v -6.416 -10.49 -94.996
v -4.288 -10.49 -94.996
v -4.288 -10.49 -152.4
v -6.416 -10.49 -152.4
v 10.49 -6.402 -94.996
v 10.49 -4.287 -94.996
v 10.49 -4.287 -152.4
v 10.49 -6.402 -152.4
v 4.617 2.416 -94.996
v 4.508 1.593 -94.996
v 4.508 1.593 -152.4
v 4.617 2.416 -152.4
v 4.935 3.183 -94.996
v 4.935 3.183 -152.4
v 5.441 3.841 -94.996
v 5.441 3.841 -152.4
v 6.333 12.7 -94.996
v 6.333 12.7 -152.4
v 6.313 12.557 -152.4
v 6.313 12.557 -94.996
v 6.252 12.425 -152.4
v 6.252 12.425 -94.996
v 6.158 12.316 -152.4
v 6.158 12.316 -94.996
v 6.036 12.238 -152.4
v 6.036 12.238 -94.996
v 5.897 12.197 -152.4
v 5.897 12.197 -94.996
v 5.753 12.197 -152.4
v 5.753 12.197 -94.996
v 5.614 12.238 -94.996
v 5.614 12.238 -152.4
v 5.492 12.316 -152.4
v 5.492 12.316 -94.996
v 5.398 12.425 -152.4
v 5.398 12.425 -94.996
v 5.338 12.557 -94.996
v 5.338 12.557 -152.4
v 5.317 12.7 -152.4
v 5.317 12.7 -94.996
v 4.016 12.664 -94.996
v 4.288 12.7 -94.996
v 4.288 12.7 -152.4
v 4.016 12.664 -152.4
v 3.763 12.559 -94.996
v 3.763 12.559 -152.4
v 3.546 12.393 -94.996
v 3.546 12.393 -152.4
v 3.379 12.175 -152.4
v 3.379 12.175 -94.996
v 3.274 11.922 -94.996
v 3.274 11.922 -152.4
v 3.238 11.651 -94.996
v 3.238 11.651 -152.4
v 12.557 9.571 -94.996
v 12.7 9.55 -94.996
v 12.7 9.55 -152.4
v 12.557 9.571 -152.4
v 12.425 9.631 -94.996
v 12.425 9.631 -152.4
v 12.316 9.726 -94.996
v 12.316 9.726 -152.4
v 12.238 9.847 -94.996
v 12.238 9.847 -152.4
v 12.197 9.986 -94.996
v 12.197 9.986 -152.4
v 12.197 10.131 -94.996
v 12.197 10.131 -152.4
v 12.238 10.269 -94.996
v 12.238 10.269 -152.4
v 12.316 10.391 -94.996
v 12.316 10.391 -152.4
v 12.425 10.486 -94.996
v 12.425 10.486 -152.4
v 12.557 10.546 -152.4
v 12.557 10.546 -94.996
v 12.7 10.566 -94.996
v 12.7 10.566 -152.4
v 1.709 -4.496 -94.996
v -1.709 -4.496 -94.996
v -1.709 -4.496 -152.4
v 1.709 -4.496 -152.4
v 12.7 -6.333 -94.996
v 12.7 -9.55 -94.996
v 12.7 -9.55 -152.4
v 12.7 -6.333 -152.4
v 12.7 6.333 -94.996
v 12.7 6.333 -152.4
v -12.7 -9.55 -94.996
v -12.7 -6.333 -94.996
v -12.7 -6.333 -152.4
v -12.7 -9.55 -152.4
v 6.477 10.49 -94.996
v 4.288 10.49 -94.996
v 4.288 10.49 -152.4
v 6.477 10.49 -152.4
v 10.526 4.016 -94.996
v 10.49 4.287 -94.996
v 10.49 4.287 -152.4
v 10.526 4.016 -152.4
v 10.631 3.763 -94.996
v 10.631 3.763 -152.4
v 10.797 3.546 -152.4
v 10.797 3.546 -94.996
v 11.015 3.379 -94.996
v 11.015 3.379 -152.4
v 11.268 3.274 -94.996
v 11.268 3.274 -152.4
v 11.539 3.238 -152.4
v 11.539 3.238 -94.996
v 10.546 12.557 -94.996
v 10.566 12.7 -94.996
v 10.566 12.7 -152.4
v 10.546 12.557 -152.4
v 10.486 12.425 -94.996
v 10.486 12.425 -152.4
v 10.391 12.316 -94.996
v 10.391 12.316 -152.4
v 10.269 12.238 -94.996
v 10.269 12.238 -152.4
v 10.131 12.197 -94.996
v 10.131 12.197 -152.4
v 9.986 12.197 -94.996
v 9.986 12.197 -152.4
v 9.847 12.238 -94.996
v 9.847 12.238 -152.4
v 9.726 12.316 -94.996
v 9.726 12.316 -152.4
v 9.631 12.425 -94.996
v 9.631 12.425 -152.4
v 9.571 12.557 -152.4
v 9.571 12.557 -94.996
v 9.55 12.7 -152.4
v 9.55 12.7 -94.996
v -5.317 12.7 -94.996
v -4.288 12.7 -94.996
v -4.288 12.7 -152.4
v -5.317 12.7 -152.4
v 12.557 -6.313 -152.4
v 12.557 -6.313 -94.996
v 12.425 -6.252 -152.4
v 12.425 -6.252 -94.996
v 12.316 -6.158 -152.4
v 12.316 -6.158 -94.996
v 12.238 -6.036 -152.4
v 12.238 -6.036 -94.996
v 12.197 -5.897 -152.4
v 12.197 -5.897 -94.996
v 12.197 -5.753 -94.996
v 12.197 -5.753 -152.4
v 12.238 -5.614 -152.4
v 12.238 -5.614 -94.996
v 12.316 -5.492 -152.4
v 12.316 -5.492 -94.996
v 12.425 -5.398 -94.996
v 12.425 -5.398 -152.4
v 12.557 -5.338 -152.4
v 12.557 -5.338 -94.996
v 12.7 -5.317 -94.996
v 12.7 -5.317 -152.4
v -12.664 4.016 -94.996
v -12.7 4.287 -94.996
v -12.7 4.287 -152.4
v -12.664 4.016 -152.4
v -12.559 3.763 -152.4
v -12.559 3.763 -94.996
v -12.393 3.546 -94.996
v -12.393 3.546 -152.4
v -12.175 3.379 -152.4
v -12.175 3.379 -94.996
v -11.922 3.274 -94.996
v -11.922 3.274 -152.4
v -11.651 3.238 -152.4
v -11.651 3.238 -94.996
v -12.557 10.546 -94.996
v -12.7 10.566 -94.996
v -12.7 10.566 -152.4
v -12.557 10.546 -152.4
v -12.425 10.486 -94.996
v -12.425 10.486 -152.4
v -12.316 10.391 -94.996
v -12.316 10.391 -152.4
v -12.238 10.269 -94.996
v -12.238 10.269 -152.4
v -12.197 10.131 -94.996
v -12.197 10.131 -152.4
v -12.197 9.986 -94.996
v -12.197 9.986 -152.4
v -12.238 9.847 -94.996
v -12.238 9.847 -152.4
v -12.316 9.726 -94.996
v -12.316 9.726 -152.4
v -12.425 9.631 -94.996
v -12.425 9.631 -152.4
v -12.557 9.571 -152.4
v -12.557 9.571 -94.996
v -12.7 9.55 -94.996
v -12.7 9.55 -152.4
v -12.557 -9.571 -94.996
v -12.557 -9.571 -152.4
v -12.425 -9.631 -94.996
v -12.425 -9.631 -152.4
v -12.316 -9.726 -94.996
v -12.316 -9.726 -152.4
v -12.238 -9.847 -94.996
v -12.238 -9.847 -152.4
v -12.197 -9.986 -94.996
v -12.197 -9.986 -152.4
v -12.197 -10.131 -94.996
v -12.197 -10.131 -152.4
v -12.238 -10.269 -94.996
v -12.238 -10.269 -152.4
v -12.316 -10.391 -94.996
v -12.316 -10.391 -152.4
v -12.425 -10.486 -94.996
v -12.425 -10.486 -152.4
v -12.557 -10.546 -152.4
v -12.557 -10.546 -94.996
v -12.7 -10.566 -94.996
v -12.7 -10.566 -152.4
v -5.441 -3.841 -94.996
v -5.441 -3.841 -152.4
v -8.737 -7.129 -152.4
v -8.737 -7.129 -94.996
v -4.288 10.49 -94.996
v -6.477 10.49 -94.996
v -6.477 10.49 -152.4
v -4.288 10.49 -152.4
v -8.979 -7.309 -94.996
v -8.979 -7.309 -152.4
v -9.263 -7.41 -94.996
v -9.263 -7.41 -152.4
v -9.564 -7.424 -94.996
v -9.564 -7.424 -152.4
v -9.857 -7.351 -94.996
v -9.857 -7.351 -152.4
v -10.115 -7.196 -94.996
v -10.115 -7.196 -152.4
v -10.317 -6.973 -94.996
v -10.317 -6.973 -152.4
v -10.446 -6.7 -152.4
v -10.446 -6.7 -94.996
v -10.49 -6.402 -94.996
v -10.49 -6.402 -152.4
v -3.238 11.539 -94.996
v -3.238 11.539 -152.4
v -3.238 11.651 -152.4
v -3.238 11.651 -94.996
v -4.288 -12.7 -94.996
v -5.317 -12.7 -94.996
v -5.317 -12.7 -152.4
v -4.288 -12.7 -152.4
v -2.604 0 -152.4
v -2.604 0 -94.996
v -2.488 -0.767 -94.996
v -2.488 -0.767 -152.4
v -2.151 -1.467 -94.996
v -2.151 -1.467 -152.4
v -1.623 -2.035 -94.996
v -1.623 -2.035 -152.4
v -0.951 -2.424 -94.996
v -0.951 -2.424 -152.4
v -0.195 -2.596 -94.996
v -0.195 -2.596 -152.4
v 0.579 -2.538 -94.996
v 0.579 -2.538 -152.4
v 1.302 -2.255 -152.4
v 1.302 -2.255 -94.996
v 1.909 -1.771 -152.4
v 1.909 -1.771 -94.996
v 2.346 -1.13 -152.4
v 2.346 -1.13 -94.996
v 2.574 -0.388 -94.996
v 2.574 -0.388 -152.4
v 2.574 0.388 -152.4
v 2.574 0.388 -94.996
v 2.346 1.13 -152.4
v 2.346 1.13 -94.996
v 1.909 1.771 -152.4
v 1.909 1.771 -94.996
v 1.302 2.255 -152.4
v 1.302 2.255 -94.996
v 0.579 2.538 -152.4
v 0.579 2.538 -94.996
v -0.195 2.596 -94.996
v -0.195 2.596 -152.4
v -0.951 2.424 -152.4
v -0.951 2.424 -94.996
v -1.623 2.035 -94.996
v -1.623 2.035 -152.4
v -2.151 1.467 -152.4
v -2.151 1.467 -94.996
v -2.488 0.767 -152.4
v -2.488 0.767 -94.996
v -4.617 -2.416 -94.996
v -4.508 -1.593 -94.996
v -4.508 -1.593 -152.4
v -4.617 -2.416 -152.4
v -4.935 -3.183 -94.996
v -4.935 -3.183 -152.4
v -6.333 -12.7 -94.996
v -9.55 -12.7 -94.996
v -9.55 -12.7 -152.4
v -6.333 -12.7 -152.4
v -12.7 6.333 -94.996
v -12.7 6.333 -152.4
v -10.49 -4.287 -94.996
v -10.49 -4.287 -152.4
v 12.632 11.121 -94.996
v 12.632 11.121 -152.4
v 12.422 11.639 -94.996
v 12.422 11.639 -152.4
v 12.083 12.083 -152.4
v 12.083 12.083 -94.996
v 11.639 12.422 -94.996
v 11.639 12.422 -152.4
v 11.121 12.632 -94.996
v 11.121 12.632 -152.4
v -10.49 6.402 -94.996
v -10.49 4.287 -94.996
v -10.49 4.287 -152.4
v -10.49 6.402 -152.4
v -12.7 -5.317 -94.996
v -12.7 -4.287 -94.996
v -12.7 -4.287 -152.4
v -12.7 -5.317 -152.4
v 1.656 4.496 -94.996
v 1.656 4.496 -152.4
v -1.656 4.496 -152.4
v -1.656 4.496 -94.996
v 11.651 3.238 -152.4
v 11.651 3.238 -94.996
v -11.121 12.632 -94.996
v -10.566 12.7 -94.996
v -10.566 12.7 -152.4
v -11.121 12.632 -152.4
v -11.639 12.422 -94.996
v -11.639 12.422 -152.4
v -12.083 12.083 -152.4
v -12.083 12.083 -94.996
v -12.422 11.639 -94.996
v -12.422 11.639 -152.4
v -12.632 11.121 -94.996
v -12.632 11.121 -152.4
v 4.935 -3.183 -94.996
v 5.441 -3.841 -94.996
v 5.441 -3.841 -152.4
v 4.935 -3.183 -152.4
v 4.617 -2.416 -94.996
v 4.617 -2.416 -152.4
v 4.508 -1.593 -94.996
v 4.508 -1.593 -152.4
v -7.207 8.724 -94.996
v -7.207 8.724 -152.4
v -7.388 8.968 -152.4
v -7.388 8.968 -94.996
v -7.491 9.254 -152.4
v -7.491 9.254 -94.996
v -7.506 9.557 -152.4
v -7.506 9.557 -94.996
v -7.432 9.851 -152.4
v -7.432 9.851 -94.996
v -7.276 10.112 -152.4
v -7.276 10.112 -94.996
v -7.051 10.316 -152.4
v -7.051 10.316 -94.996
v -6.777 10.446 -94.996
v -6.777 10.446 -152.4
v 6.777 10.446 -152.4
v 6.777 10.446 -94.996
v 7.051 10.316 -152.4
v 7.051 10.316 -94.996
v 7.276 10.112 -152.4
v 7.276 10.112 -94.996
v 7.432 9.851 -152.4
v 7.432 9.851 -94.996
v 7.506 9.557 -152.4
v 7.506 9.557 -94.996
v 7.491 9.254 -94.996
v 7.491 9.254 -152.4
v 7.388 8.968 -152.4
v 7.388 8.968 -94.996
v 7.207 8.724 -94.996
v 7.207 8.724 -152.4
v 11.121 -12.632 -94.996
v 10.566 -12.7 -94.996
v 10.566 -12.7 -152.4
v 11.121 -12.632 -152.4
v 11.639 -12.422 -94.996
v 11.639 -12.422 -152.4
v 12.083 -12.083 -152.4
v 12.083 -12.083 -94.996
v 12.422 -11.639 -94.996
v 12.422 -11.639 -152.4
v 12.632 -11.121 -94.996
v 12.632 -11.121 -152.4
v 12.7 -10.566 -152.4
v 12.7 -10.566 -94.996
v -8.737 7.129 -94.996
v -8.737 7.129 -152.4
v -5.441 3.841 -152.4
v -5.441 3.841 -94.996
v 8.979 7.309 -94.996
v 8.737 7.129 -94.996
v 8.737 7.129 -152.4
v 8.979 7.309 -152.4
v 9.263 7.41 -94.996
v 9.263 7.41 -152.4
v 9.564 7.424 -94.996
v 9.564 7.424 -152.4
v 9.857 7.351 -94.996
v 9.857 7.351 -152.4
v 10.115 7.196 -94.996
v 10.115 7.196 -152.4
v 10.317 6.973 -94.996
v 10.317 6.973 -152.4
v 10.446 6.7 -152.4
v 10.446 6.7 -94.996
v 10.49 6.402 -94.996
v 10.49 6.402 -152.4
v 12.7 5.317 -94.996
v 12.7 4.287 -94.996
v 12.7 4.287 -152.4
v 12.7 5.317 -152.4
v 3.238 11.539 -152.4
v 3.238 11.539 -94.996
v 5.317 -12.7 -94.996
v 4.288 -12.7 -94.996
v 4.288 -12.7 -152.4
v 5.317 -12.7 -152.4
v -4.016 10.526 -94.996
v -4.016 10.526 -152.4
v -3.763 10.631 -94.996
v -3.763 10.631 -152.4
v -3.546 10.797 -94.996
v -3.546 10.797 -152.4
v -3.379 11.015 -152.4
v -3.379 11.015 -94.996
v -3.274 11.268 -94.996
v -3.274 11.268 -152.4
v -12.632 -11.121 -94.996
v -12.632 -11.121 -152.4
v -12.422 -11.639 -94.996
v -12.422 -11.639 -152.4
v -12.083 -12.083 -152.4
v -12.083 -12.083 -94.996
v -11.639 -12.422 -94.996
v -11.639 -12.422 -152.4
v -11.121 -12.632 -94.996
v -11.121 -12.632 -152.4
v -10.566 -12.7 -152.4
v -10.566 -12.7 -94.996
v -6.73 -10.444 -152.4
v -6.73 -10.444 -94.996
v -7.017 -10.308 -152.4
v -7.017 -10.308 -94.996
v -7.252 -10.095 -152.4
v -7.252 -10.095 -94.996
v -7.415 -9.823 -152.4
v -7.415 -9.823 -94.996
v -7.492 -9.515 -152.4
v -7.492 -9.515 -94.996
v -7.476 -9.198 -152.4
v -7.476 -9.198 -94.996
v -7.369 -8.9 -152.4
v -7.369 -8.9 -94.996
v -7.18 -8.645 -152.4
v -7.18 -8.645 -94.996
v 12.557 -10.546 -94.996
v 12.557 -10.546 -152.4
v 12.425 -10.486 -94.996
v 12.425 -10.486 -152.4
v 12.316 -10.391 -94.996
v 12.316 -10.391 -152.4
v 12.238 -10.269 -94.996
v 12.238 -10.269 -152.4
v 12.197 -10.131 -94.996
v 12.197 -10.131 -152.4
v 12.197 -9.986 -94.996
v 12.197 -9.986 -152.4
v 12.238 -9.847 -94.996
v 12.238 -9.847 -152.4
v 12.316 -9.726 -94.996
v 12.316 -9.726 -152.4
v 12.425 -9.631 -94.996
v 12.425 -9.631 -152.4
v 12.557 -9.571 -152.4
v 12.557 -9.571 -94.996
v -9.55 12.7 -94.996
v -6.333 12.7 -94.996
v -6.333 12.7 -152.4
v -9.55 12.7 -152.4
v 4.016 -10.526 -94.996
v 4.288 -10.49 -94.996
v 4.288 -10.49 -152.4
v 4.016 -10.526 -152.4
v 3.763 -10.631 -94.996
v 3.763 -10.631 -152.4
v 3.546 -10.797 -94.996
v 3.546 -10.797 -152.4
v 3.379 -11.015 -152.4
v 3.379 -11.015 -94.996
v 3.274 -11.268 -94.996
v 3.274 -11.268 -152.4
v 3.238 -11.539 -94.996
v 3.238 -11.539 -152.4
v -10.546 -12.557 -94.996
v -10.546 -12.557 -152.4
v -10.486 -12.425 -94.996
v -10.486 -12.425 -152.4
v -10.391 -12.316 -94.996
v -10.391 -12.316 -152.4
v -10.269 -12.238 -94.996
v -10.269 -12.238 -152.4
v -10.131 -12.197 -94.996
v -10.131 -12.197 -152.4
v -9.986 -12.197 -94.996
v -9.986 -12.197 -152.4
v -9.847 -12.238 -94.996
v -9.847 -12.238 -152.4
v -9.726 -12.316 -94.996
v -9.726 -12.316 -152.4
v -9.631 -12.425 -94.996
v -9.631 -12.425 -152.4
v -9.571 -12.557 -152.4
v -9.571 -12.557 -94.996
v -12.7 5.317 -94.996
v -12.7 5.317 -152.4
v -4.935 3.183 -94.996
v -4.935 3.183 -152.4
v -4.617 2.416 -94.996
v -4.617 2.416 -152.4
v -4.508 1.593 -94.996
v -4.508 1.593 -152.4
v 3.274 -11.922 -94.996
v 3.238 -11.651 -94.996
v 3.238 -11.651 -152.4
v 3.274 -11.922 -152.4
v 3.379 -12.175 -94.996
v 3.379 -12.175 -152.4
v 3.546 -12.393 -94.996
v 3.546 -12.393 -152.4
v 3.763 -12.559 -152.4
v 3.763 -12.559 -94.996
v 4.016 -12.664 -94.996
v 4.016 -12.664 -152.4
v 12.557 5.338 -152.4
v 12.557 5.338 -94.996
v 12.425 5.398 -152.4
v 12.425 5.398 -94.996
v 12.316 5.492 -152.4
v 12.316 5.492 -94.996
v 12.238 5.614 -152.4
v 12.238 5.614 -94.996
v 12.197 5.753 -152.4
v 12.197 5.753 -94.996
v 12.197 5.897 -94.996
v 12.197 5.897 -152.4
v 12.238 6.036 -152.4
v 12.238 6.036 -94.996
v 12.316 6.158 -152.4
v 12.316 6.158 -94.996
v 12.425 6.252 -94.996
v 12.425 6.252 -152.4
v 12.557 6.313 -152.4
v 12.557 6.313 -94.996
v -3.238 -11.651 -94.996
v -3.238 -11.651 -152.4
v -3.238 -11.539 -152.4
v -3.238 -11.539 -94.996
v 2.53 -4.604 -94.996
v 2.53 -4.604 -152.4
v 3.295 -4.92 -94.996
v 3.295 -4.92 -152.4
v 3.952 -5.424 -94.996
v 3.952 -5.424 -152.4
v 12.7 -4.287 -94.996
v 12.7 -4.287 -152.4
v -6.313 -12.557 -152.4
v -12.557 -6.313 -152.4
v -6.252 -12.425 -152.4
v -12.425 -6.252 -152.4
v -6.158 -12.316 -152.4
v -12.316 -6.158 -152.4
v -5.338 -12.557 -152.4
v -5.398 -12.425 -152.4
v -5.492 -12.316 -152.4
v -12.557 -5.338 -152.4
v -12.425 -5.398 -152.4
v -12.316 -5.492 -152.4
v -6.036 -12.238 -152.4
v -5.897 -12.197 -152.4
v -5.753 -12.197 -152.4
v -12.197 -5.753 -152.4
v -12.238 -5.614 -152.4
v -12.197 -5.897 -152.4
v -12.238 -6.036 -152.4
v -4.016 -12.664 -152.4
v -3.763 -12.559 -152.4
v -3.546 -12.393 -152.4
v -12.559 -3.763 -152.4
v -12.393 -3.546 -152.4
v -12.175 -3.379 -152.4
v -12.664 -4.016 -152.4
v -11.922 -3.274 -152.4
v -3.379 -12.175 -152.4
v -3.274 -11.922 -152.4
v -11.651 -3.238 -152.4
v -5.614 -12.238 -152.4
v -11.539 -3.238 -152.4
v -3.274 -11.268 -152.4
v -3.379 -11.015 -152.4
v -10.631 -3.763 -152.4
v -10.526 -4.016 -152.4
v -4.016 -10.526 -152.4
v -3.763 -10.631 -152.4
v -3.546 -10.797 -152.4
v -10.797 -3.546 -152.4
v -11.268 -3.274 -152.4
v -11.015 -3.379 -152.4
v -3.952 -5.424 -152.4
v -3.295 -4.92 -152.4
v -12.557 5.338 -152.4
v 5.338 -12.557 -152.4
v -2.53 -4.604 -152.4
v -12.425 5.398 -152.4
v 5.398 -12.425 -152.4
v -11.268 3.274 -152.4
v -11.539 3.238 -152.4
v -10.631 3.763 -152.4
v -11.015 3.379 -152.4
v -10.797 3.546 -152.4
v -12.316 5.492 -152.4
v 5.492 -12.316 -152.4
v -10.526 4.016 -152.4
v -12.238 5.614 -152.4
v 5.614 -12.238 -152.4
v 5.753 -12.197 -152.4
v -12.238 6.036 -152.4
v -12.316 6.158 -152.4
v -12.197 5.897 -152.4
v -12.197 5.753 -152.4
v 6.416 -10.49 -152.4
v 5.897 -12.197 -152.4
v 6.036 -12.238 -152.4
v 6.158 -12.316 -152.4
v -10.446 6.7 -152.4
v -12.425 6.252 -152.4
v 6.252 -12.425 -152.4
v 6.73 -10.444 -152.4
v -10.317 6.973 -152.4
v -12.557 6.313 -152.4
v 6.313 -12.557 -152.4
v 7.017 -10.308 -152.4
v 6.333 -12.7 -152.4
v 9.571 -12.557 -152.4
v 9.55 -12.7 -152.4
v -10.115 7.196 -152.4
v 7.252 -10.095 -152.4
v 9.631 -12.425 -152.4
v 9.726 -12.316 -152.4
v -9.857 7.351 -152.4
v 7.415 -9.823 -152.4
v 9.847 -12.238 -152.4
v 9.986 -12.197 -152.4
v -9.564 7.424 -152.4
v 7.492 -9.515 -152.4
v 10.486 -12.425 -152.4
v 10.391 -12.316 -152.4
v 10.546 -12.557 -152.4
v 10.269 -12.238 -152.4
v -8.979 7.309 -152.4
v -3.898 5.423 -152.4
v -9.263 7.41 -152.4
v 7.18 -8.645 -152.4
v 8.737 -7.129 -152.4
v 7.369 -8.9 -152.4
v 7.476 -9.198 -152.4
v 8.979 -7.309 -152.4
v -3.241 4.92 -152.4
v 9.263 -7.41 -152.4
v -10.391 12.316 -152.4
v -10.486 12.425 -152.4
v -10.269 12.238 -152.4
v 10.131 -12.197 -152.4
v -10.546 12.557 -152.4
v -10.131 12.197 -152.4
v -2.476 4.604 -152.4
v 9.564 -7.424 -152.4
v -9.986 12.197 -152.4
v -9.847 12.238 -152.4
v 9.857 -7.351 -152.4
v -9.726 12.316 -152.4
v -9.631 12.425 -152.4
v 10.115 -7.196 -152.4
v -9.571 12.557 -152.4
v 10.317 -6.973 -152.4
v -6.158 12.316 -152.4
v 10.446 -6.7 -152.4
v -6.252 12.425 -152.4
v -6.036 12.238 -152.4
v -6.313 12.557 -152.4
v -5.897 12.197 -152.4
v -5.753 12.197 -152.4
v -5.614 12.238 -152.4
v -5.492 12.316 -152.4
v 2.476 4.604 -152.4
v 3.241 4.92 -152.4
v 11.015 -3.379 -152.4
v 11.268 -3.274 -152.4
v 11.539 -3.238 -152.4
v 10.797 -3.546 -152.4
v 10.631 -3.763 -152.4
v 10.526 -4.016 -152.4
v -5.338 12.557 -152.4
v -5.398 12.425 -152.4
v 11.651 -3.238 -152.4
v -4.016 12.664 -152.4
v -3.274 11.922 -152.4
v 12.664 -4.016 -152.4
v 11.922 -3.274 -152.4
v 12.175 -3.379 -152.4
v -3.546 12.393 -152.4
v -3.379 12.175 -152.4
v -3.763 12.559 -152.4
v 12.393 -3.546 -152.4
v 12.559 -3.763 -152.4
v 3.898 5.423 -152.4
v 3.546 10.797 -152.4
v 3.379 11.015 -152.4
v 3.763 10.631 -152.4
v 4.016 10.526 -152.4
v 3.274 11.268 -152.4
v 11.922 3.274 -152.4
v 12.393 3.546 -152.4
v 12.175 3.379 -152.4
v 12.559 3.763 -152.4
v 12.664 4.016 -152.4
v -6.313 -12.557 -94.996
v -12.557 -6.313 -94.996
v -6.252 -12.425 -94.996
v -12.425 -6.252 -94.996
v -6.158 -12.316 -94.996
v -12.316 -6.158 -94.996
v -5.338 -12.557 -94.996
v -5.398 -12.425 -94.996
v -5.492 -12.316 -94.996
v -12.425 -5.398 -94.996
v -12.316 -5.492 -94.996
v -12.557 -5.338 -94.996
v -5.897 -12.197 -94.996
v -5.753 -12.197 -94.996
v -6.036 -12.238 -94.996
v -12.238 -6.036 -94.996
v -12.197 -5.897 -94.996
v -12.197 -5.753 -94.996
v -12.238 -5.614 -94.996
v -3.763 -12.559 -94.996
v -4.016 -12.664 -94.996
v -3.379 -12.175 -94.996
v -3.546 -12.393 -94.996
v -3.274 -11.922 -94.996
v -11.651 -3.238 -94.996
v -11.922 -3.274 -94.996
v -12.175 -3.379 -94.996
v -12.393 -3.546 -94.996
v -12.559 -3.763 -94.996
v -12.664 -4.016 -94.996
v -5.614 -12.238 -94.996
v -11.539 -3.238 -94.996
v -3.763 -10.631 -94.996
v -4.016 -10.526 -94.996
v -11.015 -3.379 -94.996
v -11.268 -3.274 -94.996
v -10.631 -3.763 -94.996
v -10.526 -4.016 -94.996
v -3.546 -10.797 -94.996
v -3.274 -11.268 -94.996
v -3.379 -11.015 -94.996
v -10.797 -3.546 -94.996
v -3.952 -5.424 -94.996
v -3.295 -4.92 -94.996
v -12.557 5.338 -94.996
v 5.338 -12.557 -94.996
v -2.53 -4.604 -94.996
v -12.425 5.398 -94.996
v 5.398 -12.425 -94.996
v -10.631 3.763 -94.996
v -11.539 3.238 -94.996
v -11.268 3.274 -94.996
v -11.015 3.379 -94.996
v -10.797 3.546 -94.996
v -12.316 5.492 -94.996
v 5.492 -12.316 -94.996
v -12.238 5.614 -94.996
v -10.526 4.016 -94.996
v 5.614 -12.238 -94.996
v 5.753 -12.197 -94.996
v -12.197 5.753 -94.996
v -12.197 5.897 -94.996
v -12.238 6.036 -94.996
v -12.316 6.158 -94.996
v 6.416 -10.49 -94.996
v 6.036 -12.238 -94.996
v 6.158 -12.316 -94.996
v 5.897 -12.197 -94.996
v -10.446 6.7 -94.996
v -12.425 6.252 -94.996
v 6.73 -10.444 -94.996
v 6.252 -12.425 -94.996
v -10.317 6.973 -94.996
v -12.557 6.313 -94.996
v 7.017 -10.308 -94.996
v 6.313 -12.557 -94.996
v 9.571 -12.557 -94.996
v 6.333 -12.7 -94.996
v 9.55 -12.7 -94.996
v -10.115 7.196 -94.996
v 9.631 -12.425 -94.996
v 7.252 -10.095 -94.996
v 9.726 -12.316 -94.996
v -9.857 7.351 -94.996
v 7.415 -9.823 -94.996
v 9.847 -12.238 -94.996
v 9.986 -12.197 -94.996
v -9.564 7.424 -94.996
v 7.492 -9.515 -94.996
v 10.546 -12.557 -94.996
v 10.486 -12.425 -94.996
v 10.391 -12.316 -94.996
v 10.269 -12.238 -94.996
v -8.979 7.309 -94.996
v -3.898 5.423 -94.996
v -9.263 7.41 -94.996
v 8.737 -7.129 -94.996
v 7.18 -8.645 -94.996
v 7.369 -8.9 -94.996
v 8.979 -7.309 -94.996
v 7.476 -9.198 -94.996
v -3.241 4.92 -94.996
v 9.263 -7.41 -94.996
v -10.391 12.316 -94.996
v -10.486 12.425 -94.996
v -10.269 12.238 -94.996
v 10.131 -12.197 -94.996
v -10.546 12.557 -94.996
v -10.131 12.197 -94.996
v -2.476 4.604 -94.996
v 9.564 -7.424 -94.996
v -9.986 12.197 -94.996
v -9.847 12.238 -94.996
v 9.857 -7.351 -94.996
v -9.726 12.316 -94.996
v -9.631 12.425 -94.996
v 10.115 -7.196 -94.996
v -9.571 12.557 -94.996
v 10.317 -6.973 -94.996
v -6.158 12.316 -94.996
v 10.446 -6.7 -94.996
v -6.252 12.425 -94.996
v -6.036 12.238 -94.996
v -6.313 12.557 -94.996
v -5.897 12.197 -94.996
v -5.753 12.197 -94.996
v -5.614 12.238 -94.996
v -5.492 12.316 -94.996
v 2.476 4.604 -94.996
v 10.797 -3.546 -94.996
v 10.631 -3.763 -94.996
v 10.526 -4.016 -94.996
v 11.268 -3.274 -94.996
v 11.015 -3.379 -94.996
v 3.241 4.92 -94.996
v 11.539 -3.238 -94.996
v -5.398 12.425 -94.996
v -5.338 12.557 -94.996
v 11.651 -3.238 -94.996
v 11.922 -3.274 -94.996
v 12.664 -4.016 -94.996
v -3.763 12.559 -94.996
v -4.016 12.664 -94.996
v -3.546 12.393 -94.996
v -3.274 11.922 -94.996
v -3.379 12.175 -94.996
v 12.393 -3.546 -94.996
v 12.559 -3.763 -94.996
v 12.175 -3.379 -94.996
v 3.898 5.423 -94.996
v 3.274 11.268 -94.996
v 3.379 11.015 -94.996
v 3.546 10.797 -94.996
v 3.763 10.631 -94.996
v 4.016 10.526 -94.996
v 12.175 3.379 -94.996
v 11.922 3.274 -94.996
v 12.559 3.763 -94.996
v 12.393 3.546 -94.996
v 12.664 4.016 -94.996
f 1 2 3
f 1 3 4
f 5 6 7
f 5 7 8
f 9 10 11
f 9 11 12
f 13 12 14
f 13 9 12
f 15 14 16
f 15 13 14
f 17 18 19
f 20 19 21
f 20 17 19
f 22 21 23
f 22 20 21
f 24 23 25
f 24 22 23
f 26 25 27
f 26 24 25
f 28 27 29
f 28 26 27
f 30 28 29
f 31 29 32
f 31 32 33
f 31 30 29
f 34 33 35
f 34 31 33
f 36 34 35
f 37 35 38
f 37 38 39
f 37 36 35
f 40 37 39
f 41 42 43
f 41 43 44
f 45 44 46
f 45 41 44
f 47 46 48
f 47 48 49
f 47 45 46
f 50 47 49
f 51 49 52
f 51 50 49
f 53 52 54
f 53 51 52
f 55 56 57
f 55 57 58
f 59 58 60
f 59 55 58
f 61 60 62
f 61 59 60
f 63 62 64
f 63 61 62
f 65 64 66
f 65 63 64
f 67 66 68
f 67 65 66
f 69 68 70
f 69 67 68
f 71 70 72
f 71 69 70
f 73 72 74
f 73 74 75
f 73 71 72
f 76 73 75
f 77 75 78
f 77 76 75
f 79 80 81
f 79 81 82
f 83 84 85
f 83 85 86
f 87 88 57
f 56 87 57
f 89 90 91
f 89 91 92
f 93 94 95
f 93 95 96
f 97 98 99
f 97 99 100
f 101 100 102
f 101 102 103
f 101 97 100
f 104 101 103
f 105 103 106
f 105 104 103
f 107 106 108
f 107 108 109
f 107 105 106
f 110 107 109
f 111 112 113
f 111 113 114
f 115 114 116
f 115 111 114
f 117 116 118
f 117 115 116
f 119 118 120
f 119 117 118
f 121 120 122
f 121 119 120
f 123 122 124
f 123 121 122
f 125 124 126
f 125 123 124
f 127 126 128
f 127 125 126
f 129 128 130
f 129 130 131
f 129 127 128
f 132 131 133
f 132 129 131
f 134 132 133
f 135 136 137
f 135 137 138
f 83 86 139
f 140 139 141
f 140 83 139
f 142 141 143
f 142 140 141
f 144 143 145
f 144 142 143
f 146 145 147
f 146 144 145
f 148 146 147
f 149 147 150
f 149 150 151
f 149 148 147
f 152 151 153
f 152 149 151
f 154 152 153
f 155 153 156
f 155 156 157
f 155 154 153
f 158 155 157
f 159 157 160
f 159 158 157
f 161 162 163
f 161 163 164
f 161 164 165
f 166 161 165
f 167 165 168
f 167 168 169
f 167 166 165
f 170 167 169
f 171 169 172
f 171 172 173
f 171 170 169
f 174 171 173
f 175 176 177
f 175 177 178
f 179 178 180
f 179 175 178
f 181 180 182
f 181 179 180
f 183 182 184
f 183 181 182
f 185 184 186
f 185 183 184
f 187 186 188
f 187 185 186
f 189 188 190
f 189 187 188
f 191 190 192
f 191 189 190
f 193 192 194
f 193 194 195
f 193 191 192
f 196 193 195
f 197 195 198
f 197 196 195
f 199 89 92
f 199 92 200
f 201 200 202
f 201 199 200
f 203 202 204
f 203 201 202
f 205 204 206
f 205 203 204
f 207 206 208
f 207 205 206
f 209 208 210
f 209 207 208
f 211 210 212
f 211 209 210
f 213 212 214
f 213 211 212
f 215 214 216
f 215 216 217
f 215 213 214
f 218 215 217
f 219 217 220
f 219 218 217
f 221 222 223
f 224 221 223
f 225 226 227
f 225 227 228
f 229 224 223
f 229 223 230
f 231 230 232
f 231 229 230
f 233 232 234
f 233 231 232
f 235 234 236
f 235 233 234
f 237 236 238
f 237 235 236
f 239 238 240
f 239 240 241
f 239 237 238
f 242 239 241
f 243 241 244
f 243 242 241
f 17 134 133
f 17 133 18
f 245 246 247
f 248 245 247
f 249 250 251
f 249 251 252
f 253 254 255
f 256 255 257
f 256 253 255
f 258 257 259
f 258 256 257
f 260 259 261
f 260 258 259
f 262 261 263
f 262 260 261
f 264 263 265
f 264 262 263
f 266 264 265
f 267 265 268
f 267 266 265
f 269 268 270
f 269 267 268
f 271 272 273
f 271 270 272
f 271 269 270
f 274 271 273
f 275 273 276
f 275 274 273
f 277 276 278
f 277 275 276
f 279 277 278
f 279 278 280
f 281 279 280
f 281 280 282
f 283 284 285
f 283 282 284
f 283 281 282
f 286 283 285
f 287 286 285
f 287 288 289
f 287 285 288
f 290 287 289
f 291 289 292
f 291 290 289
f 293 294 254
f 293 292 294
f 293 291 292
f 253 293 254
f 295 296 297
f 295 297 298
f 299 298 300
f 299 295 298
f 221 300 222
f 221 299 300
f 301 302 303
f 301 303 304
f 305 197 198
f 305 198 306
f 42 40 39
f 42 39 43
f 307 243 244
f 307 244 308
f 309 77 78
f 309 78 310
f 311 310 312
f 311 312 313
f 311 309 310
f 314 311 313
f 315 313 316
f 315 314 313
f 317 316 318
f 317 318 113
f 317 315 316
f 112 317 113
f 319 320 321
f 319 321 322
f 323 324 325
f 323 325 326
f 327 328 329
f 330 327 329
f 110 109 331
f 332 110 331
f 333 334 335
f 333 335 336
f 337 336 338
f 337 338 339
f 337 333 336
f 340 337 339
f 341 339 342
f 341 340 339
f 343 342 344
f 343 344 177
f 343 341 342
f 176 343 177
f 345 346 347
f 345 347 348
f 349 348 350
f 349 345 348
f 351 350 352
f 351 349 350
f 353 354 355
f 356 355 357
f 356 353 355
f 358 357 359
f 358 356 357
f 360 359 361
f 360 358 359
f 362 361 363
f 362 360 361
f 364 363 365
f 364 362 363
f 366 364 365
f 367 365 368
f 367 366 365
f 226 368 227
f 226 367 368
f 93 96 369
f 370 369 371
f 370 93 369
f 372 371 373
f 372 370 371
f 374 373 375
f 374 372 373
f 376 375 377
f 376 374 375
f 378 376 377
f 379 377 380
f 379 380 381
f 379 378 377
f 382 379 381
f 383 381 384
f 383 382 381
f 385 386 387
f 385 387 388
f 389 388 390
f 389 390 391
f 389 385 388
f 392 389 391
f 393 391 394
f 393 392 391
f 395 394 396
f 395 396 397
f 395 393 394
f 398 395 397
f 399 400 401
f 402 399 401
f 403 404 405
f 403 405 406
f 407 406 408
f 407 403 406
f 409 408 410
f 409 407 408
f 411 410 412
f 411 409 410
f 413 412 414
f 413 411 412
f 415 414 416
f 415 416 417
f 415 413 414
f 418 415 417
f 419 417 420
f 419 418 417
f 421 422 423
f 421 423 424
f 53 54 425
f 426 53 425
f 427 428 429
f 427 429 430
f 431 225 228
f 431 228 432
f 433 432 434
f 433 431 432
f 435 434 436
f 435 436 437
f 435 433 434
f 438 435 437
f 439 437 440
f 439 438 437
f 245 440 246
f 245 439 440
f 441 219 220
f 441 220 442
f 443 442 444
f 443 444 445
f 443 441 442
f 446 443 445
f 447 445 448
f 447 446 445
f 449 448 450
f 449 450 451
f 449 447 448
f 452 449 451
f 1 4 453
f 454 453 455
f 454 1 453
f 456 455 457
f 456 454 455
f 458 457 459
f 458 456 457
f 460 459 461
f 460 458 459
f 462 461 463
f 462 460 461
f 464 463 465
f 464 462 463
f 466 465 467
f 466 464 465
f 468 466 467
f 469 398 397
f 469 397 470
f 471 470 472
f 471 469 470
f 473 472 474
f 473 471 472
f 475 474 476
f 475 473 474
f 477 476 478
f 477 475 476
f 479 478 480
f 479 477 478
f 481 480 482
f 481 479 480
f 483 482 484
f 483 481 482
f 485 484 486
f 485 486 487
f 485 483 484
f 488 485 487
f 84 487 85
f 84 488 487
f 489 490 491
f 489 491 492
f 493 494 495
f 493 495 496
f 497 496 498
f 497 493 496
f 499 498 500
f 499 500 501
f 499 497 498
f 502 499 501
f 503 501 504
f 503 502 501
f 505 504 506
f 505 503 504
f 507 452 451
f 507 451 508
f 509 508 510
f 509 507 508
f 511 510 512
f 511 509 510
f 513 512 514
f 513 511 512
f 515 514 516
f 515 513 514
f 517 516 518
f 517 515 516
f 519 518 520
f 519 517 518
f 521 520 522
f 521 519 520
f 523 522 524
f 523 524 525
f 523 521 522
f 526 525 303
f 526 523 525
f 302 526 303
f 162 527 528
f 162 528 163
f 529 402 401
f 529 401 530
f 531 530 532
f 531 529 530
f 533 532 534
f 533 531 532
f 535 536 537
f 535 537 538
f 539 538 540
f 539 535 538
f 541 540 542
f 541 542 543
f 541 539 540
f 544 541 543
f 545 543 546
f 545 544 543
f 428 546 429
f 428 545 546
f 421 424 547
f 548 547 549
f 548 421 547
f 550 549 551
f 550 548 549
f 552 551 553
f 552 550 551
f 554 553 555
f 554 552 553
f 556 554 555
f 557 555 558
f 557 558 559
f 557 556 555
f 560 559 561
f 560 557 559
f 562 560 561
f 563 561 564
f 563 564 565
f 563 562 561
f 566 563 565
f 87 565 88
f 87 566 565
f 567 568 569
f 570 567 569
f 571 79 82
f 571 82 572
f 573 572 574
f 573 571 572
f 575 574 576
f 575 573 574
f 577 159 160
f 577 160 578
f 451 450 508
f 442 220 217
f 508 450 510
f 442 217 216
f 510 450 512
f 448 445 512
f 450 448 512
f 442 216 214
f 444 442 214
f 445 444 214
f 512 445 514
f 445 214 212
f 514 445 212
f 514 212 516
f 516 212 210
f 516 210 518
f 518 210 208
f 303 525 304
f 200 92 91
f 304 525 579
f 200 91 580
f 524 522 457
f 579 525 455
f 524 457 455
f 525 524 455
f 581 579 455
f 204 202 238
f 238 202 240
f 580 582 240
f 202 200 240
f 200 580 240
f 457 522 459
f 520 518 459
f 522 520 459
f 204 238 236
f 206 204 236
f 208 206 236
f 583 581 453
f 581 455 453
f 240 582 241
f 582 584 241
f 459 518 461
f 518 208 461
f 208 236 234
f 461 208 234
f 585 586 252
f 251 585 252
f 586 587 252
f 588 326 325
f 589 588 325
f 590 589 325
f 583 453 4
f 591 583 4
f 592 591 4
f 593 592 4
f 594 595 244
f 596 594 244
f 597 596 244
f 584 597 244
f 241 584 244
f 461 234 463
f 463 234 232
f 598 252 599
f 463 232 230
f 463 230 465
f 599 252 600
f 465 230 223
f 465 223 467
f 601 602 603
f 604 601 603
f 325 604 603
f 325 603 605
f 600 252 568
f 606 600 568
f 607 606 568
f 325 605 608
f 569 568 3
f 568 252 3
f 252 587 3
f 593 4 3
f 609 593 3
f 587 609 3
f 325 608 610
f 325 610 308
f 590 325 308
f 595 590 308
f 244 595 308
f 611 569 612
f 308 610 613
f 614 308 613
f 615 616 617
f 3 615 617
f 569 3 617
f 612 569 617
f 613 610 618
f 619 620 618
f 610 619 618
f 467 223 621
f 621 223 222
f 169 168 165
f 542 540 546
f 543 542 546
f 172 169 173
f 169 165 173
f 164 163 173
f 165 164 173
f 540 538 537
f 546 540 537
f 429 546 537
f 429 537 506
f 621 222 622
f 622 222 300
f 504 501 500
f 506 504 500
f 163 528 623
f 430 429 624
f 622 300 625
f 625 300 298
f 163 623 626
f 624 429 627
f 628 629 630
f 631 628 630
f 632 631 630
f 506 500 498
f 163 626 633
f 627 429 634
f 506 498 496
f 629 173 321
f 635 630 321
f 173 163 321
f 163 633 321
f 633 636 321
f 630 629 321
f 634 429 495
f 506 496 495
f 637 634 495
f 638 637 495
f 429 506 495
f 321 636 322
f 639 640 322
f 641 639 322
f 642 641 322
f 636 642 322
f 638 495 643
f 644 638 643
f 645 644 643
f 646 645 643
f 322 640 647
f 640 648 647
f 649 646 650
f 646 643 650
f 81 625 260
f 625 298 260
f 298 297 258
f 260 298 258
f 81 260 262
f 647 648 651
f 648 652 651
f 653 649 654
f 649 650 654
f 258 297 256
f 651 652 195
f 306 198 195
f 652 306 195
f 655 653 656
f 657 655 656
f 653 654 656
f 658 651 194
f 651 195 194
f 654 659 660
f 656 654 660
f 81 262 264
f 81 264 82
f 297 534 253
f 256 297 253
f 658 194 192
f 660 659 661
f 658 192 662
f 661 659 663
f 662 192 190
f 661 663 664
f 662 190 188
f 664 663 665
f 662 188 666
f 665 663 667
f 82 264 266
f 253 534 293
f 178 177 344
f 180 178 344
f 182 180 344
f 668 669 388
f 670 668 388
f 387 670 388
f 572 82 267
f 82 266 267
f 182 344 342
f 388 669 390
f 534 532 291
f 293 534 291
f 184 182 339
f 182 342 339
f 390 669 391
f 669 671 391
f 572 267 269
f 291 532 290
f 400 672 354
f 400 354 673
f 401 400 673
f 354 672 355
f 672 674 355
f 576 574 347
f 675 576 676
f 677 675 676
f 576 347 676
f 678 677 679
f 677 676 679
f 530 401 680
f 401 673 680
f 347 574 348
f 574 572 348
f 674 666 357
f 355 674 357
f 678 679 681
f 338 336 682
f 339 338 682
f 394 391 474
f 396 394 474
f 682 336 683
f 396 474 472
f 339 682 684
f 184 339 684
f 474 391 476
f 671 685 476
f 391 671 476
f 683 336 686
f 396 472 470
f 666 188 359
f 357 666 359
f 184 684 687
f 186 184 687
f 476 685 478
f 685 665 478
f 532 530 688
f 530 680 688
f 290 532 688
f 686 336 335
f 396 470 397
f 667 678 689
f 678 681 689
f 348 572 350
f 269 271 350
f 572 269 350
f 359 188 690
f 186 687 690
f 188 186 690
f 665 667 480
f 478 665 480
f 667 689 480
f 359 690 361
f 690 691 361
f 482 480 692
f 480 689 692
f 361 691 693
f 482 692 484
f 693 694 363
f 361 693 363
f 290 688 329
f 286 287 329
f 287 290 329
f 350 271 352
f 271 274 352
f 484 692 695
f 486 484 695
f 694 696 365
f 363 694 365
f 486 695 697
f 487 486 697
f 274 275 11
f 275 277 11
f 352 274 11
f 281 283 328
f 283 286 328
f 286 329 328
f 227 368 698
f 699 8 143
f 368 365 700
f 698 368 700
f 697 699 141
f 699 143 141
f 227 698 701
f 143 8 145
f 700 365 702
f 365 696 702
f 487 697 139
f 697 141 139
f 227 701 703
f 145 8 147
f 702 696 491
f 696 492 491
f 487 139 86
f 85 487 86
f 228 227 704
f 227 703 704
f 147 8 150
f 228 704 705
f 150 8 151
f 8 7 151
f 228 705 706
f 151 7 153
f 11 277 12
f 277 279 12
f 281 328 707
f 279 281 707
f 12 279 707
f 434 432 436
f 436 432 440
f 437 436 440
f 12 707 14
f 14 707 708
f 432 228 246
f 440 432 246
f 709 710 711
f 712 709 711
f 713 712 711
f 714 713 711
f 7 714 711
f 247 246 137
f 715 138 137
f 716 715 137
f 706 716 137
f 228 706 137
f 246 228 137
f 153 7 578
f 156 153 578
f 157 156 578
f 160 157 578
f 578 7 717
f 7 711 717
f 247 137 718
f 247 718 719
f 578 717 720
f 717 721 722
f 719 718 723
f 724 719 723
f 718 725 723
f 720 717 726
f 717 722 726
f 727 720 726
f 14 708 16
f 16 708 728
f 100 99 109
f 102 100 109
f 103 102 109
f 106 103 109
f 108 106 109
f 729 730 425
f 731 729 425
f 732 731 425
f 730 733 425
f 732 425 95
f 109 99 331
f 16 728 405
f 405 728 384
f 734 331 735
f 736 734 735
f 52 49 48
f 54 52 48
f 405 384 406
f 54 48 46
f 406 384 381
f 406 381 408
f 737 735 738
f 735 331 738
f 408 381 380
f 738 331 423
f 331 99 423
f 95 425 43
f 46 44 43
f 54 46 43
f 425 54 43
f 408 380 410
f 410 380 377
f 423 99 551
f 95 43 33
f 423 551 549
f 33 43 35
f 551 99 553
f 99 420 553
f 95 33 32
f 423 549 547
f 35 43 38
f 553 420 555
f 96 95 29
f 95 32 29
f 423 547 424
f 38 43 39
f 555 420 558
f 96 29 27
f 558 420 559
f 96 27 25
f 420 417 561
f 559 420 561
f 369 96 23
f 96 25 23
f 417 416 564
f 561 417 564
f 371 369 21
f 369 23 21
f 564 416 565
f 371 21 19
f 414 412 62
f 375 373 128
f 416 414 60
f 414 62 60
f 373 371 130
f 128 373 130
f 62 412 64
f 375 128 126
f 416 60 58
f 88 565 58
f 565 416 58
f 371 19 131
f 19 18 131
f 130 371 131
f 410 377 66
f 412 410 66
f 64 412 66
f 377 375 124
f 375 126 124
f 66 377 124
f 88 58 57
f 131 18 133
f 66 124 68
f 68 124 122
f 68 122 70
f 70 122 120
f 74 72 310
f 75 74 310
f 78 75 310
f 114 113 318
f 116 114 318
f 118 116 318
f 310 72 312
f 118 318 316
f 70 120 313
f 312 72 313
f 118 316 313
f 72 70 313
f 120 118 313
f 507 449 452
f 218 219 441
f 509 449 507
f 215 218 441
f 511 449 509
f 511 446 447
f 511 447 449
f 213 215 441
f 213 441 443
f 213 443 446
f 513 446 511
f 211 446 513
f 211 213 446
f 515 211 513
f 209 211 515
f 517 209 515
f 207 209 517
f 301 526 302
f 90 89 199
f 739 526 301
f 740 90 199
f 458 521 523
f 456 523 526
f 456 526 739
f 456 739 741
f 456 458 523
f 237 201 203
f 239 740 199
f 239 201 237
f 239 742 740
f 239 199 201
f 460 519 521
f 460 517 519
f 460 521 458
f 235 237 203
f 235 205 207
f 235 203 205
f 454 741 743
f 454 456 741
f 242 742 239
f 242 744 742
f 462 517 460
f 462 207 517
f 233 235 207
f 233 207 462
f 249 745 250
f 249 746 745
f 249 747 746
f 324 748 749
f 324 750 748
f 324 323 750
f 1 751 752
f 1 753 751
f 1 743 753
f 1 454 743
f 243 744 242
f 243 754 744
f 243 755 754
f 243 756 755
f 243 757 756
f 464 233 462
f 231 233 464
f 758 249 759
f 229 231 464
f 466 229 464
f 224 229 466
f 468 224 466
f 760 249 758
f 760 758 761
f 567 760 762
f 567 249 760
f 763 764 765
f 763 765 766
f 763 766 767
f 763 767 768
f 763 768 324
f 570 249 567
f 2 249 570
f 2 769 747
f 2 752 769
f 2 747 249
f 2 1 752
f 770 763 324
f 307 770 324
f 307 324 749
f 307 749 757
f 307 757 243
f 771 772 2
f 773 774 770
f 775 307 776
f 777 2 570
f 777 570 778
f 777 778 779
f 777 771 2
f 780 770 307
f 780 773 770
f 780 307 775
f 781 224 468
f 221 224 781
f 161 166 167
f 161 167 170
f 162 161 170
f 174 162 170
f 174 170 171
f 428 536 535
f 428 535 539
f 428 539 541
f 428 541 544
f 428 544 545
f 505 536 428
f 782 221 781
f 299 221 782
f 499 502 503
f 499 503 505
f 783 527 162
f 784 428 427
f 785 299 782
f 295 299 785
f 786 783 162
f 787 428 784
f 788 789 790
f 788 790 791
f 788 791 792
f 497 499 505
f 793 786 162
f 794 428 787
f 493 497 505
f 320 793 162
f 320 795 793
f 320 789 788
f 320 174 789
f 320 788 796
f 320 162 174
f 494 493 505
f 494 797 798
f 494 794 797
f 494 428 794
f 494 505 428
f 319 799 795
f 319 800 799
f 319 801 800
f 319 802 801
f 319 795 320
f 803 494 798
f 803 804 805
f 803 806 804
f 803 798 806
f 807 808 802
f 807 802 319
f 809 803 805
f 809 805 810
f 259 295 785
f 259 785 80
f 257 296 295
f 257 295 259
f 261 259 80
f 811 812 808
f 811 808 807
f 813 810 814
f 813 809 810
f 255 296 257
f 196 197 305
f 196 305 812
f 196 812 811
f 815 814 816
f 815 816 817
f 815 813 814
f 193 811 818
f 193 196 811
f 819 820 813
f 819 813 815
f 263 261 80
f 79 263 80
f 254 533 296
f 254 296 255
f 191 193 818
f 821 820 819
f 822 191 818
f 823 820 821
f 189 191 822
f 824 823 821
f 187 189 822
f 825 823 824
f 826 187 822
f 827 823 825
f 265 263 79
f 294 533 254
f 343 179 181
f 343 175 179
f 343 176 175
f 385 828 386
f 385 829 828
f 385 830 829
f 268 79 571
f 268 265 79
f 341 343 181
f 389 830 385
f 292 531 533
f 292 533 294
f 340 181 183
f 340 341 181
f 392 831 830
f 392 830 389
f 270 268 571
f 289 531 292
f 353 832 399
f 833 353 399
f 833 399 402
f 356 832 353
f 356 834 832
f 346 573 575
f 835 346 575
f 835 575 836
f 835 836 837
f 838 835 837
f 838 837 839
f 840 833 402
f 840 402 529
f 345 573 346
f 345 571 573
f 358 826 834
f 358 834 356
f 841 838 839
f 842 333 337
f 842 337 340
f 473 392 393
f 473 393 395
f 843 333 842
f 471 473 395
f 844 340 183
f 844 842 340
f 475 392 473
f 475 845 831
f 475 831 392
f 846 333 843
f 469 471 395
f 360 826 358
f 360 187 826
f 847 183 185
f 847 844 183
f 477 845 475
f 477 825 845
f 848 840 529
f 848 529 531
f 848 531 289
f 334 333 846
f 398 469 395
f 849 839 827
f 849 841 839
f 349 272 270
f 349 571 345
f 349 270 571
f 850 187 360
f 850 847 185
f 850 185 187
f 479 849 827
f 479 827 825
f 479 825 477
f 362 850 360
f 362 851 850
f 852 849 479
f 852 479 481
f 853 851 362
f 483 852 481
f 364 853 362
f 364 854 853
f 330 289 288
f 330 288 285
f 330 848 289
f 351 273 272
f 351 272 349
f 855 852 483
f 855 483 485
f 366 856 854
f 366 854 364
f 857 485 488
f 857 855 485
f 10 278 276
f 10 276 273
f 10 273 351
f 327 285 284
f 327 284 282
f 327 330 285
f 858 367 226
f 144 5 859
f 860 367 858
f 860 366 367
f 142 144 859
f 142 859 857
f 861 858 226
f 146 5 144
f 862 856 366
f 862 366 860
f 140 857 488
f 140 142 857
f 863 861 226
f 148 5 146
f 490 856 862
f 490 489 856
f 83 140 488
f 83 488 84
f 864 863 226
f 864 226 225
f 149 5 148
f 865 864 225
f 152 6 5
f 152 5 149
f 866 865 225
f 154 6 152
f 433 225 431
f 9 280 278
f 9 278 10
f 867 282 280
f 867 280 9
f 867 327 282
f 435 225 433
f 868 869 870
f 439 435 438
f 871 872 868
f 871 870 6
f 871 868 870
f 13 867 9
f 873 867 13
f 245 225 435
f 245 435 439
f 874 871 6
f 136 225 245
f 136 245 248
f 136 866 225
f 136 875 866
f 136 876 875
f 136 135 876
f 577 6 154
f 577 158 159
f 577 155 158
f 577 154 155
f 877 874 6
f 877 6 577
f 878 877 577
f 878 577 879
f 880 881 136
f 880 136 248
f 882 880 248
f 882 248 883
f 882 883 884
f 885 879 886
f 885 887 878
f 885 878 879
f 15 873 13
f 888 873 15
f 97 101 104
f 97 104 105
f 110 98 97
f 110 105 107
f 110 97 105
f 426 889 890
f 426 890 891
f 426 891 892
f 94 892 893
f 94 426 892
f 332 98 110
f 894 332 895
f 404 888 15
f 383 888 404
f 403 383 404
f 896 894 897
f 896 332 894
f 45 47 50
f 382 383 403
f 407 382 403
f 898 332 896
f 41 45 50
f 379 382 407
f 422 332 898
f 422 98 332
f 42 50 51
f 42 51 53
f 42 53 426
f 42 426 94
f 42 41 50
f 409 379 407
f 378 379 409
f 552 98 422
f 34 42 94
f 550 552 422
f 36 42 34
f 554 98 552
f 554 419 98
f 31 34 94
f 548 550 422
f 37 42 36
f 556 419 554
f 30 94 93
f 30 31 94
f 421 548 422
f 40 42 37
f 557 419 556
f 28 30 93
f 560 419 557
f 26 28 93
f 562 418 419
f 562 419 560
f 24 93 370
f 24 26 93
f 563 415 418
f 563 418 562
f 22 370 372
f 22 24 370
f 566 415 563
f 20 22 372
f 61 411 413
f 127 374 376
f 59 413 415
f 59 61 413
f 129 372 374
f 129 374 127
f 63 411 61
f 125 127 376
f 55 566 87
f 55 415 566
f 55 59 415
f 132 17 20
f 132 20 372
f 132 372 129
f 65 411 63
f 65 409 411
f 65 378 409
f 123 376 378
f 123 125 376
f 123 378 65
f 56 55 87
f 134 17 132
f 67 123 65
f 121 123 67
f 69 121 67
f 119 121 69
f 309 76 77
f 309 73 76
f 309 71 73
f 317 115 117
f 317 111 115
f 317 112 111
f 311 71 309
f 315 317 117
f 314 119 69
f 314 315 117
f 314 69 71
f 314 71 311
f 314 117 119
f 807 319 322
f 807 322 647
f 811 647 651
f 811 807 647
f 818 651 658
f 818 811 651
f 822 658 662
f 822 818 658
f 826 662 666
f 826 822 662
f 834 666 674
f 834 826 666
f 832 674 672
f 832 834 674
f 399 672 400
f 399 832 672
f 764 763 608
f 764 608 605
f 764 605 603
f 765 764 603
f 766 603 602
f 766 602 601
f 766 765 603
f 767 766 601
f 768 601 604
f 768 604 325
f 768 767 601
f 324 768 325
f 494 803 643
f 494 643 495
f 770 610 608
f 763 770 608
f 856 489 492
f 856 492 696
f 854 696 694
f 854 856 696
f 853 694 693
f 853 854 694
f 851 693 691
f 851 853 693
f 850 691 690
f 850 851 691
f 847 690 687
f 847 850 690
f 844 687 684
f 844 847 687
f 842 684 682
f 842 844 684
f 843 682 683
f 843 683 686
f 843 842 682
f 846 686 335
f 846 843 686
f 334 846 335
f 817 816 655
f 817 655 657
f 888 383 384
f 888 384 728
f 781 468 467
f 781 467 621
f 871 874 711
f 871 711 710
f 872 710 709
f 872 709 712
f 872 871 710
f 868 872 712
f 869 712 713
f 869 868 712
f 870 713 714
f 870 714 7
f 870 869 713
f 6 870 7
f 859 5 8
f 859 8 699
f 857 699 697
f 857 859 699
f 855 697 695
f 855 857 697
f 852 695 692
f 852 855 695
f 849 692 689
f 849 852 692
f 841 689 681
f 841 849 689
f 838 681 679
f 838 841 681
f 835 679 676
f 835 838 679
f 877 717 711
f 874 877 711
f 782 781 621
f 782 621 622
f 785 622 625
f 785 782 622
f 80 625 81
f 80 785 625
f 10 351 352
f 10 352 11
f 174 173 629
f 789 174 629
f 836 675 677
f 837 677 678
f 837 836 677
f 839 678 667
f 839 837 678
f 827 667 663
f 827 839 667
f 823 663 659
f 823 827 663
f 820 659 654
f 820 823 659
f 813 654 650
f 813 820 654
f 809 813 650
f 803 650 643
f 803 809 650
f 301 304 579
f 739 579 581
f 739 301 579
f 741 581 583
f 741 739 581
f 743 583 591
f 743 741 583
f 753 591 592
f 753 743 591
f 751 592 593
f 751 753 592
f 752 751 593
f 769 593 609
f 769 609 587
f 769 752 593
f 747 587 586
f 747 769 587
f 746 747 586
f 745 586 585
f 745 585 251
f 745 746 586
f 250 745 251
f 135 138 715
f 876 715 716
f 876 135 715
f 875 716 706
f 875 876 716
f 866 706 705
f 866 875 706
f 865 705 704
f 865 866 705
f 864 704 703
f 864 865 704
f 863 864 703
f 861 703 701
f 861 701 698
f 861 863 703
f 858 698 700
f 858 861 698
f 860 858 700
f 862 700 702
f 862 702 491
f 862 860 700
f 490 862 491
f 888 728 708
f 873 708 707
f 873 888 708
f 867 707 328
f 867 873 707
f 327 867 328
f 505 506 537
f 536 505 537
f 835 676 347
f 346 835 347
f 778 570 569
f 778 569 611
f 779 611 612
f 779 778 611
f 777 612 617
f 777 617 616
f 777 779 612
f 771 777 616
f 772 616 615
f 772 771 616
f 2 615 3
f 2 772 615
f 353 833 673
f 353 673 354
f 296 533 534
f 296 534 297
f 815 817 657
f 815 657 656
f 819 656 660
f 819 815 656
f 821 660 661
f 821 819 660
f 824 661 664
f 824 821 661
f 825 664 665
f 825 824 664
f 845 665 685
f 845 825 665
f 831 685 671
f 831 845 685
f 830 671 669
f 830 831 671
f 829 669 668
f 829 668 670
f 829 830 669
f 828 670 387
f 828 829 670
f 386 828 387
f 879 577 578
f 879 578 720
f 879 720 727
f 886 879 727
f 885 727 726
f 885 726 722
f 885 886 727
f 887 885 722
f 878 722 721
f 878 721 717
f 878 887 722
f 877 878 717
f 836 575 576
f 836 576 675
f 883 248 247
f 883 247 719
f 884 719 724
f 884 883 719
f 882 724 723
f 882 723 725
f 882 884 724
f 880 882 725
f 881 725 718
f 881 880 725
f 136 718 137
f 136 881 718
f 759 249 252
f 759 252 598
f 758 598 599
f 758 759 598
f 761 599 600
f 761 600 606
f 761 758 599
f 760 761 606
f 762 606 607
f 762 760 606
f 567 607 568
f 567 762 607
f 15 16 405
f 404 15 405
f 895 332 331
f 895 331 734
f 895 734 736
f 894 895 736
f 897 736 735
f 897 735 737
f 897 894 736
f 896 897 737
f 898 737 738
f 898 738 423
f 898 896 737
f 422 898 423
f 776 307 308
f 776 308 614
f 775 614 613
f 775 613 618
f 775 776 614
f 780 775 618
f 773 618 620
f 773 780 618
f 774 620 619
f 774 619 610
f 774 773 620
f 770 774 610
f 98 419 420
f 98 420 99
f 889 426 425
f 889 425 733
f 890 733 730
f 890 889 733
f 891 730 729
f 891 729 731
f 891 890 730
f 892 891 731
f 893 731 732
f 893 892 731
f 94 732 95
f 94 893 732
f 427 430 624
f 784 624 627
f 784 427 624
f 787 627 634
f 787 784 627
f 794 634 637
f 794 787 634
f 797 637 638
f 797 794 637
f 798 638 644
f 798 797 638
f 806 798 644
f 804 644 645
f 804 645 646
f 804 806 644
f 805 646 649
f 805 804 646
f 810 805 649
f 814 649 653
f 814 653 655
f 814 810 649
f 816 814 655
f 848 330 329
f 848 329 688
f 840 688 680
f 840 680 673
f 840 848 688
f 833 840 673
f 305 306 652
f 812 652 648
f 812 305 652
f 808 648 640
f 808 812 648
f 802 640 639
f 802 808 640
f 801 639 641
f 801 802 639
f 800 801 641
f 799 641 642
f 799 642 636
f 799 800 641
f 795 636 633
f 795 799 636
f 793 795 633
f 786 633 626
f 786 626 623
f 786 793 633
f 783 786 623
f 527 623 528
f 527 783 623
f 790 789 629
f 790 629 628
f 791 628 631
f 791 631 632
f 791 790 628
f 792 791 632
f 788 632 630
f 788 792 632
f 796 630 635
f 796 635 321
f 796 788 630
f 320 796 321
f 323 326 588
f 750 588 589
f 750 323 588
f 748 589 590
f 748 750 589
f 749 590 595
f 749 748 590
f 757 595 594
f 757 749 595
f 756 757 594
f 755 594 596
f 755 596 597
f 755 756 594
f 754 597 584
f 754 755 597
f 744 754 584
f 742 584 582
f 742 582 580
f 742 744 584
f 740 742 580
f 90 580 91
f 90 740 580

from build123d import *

# Parameters (mm, degrees)
SKETCH1_R           = 2.6035
BOSS_EXTRUDE1_DEPTH = 152.4
SKETCH2_R           = 23.941884012
CUT_EXTRUDE1_DEPTH  = 247.396


with BuildPart() as part:
    # Sketch1 → Boss-Extrude1 (new, symmetric)
    with BuildSketch(Plane.XY):
        with BuildLine():
            Line((-7.179650497, -8.645192506), (-3.952270251, -5.423690499))
            ThreePointArc((-3.952270251, -5.423690499), (-2.922936451, -4.736929036), (-1.709253557, -4.4958))
            Line((-1.709253557, -4.4958), (1.709253557, -4.4958))
            ThreePointArc((1.709253557, -4.4958), (2.922936451, -4.736929036), (3.952270251, -5.423690499))
            Line((3.952270251, -5.423690499), (7.179650497, -8.645192506))
            ThreePointArc((7.179650497, -8.645192506), (7.41473083, -9.822813117), (6.416408329, -10.4902))
            Line((6.416408329, -10.4902), (4.287512407, -10.4902))
            ThreePointArc((4.287512407, -10.4902), (3.54574862, -10.79744862), (3.2385, -11.539212407))
            Line((3.2385, -11.539212407), (3.2385, -11.650987593))
            ThreePointArc((3.2385, -11.650987593), (3.54574862, -12.39275138), (4.287512407, -12.7))
            Line((4.287512407, -12.7), (5.317126718, -12.7))
            ThreePointArc((5.317126718, -12.7), (5.825126718, -12.192), (6.333126718, -12.7))
            Line((6.333126718, -12.7), (9.550443118, -12.7))
            ThreePointArc((9.550443118, -12.7), (10.058366869, -12.192000006), (10.566443095, -12.699847501))
            ThreePointArc((10.566443095, -12.699847501), (12.082537762, -12.08250727), (12.699846982, -10.566399977))
            ThreePointArc((12.699846982, -10.566399977), (12.192000006, -10.058323491), (12.7, -9.5504))
            Line((12.7, -9.5504), (12.7, -6.3330836))
            ThreePointArc((12.7, -6.3330836), (12.192, -5.8250836), (12.7, -5.3170836))
            Line((12.7, -5.3170836), (12.7, -4.287469289))
            ThreePointArc((12.7, -4.287469289), (12.39275138, -3.545705502), (11.650987593, -3.238456882))
            Line((11.650987593, -3.238456882), (11.539212407, -3.238456882))
            ThreePointArc((11.539212407, -3.238456882), (10.79744862, -3.545705502), (10.4902, -4.287469289))
            Line((10.4902, -4.287469289), (10.4902, -6.402089023))
            ThreePointArc((10.4902, -6.402089023), (9.856505071, -7.351067942), (8.737131347, -7.129408934))
            Line((8.737131347, -7.129408934), (5.441005833, -3.840816462))
            ThreePointArc((5.441005833, -3.840816462), (4.750877967, -2.809883091), (4.5085, -1.593185507))
            Line((4.5085, -1.593185507), (4.5085, 1.593185507))
            ThreePointArc((4.5085, 1.593185507), (4.750877967, 2.809883091), (5.441005833, 3.840816462))
            Line((5.441005833, 3.840816462), (8.737131347, 7.129408934))
            ThreePointArc((8.737131347, 7.129408934), (9.856505071, 7.351067942), (10.4902, 6.402089023))
            Line((10.4902, 6.402089023), (10.4902, 4.287469289))
            ThreePointArc((10.4902, 4.287469289), (10.79744862, 3.545705502), (11.539212407, 3.238456882))
            Line((11.539212407, 3.238456882), (11.650987593, 3.238456882))
            ThreePointArc((11.650987593, 3.238456882), (12.39275138, 3.545705502), (12.7, 4.287469289))
            Line((12.7, 4.287469289), (12.7, 5.3170836))
            ThreePointArc((12.7, 5.3170836), (12.192, 5.8250836), (12.7, 6.3330836))
            Line((12.7, 6.3330836), (12.7, 9.5504))
            ThreePointArc((12.7, 9.5504), (12.192000006, 10.058323491), (12.699846982, 10.566399977))
            ThreePointArc((12.699846982, 10.566399977), (12.082537762, 12.08250727), (10.566443095, 12.699847501))
            ThreePointArc((10.566443095, 12.699847501), (10.058366869, 12.192000006), (9.550443118, 12.7))
            Line((9.550443118, 12.7), (6.333126718, 12.7))
            ThreePointArc((6.333126718, 12.7), (5.825126718, 12.192), (5.317126718, 12.7))
            Line((5.317126718, 12.7), (4.287512407, 12.7))
            ThreePointArc((4.287512407, 12.7), (3.54574862, 12.39275138), (3.2385, 11.650987593))
            Line((3.2385, 11.650987593), (3.2385, 11.539212407))
            ThreePointArc((3.2385, 11.539212407), (3.54574862, 10.79744862), (4.287512407, 10.4902))
            Line((4.287512407, 10.4902), (6.476788598, 10.4902))
            ThreePointArc((6.476788598, 10.4902), (7.432222385, 9.85140422), (7.207036008, 8.724370562))
            Line((7.207036008, 8.724370562), (3.898272566, 5.423169045))
            ThreePointArc((3.898272566, 5.423169045), (2.869120213, 4.736787962), (1.655778399, 4.4958))
            Line((1.655778399, 4.4958), (-1.655778399, 4.4958))
            ThreePointArc((-1.655778399, 4.4958), (-2.869120213, 4.736787962), (-3.898272566, 5.423169045))
            Line((-3.898272566, 5.423169045), (-7.207036008, 8.724370562))
            ThreePointArc((-7.207036008, 8.724370562), (-7.432222385, 9.85140422), (-6.476788598, 10.4902))
            Line((-6.476788598, 10.4902), (-4.287512407, 10.4902))
            ThreePointArc((-4.287512407, 10.4902), (-3.54574862, 10.79744862), (-3.2385, 11.539212407))
            Line((-3.2385, 11.539212407), (-3.2385, 11.650987593))
            ThreePointArc((-3.2385, 11.650987593), (-3.54574862, 12.39275138), (-4.287512407, 12.7))
            Line((-4.287512407, 12.7), (-5.317126718, 12.7))
            ThreePointArc((-5.317126718, 12.7), (-5.825126718, 12.192), (-6.333126718, 12.7))
            Line((-6.333126718, 12.7), (-9.550443118, 12.7))
            ThreePointArc((-9.550443118, 12.7), (-10.058366869, 12.192000006), (-10.566443095, 12.699847501))
            ThreePointArc((-10.566443095, 12.699847501), (-12.082537762, 12.08250727), (-12.699846982, 10.566399977))
            ThreePointArc((-12.699846982, 10.566399977), (-12.192000006, 10.058323491), (-12.7, 9.5504))
            Line((-12.7, 9.5504), (-12.7, 6.3330836))
            ThreePointArc((-12.7, 6.3330836), (-12.192, 5.8250836), (-12.7, 5.3170836))
            Line((-12.7, 5.3170836), (-12.7, 4.287469289))
            ThreePointArc((-12.7, 4.287469289), (-12.39275138, 3.545705502), (-11.650987593, 3.238456882))
            Line((-11.650987593, 3.238456882), (-11.539212407, 3.238456882))
            ThreePointArc((-11.539212407, 3.238456882), (-10.79744862, 3.545705502), (-10.4902, 4.287469289))
            Line((-10.4902, 4.287469289), (-10.4902, 6.402089023))
            ThreePointArc((-10.4902, 6.402089023), (-9.856505071, 7.351067942), (-8.737131347, 7.129408934))
            Line((-8.737131347, 7.129408934), (-5.441005833, 3.840816462))
            ThreePointArc((-5.441005833, 3.840816462), (-4.750877967, 2.809883091), (-4.5085, 1.593185507))
            Line((-4.5085, 1.593185507), (-4.5085, -1.593185507))
            ThreePointArc((-4.5085, -1.593185507), (-4.750877967, -2.809883091), (-5.441005833, -3.840816462))
            Line((-5.441005833, -3.840816462), (-8.737131347, -7.129408934))
            ThreePointArc((-8.737131347, -7.129408934), (-9.856505071, -7.351067942), (-10.4902, -6.402089023))
            Line((-10.4902, -6.402089023), (-10.4902, -4.287469289))
            ThreePointArc((-10.4902, -4.287469289), (-10.79744862, -3.545705502), (-11.539212407, -3.238456882))
            Line((-11.539212407, -3.238456882), (-11.650987593, -3.238456882))
            ThreePointArc((-11.650987593, -3.238456882), (-12.39275138, -3.545705502), (-12.7, -4.287469289))
            Line((-12.7, -4.287469289), (-12.7, -5.3170836))
            ThreePointArc((-12.7, -5.3170836), (-12.192, -5.8250836), (-12.7, -6.3330836))
            Line((-12.7, -6.3330836), (-12.7, -9.5504))
            ThreePointArc((-12.7, -9.5504), (-12.192000006, -10.058323491), (-12.699846982, -10.566399977))
            ThreePointArc((-12.699846982, -10.566399977), (-12.082537762, -12.08250727), (-10.566443095, -12.699847501))
            ThreePointArc((-10.566443095, -12.699847501), (-10.058366869, -12.192000006), (-9.550443118, -12.7))
            Line((-9.550443118, -12.7), (-6.333126718, -12.7))
            ThreePointArc((-6.333126718, -12.7), (-5.825126718, -12.192), (-5.317126718, -12.7))
            Line((-5.317126718, -12.7), (-4.287512407, -12.7))
            ThreePointArc((-4.287512407, -12.7), (-3.54574862, -12.39275138), (-3.2385, -11.650987593))
            Line((-3.2385, -11.650987593), (-3.2385, -11.539212407))
            ThreePointArc((-3.2385, -11.539212407), (-3.54574862, -10.79744862), (-4.287512407, -10.4902))
            Line((-4.287512407, -10.4902), (-6.416408329, -10.4902))
            ThreePointArc((-6.416408329, -10.4902), (-7.41473083, -9.822813117), (-7.179650497, -8.645192506))
        make_face()
        with Locations(Location((0, 0, 0), (0, 0, 180))):
            Circle(SKETCH1_R, mode=Mode.SUBTRACT)
    extrude(amount=BOSS_EXTRUDE1_DEPTH, both=True)

    # Sketch2 → Cut-Extrude1 (cut)
    with BuildSketch(Plane.XY.offset(152.4)):
        Circle(SKETCH2_R)
    extrude(amount=-CUT_EXTRUDE1_DEPTH, mode=Mode.SUBTRACT)


solid = part.part
